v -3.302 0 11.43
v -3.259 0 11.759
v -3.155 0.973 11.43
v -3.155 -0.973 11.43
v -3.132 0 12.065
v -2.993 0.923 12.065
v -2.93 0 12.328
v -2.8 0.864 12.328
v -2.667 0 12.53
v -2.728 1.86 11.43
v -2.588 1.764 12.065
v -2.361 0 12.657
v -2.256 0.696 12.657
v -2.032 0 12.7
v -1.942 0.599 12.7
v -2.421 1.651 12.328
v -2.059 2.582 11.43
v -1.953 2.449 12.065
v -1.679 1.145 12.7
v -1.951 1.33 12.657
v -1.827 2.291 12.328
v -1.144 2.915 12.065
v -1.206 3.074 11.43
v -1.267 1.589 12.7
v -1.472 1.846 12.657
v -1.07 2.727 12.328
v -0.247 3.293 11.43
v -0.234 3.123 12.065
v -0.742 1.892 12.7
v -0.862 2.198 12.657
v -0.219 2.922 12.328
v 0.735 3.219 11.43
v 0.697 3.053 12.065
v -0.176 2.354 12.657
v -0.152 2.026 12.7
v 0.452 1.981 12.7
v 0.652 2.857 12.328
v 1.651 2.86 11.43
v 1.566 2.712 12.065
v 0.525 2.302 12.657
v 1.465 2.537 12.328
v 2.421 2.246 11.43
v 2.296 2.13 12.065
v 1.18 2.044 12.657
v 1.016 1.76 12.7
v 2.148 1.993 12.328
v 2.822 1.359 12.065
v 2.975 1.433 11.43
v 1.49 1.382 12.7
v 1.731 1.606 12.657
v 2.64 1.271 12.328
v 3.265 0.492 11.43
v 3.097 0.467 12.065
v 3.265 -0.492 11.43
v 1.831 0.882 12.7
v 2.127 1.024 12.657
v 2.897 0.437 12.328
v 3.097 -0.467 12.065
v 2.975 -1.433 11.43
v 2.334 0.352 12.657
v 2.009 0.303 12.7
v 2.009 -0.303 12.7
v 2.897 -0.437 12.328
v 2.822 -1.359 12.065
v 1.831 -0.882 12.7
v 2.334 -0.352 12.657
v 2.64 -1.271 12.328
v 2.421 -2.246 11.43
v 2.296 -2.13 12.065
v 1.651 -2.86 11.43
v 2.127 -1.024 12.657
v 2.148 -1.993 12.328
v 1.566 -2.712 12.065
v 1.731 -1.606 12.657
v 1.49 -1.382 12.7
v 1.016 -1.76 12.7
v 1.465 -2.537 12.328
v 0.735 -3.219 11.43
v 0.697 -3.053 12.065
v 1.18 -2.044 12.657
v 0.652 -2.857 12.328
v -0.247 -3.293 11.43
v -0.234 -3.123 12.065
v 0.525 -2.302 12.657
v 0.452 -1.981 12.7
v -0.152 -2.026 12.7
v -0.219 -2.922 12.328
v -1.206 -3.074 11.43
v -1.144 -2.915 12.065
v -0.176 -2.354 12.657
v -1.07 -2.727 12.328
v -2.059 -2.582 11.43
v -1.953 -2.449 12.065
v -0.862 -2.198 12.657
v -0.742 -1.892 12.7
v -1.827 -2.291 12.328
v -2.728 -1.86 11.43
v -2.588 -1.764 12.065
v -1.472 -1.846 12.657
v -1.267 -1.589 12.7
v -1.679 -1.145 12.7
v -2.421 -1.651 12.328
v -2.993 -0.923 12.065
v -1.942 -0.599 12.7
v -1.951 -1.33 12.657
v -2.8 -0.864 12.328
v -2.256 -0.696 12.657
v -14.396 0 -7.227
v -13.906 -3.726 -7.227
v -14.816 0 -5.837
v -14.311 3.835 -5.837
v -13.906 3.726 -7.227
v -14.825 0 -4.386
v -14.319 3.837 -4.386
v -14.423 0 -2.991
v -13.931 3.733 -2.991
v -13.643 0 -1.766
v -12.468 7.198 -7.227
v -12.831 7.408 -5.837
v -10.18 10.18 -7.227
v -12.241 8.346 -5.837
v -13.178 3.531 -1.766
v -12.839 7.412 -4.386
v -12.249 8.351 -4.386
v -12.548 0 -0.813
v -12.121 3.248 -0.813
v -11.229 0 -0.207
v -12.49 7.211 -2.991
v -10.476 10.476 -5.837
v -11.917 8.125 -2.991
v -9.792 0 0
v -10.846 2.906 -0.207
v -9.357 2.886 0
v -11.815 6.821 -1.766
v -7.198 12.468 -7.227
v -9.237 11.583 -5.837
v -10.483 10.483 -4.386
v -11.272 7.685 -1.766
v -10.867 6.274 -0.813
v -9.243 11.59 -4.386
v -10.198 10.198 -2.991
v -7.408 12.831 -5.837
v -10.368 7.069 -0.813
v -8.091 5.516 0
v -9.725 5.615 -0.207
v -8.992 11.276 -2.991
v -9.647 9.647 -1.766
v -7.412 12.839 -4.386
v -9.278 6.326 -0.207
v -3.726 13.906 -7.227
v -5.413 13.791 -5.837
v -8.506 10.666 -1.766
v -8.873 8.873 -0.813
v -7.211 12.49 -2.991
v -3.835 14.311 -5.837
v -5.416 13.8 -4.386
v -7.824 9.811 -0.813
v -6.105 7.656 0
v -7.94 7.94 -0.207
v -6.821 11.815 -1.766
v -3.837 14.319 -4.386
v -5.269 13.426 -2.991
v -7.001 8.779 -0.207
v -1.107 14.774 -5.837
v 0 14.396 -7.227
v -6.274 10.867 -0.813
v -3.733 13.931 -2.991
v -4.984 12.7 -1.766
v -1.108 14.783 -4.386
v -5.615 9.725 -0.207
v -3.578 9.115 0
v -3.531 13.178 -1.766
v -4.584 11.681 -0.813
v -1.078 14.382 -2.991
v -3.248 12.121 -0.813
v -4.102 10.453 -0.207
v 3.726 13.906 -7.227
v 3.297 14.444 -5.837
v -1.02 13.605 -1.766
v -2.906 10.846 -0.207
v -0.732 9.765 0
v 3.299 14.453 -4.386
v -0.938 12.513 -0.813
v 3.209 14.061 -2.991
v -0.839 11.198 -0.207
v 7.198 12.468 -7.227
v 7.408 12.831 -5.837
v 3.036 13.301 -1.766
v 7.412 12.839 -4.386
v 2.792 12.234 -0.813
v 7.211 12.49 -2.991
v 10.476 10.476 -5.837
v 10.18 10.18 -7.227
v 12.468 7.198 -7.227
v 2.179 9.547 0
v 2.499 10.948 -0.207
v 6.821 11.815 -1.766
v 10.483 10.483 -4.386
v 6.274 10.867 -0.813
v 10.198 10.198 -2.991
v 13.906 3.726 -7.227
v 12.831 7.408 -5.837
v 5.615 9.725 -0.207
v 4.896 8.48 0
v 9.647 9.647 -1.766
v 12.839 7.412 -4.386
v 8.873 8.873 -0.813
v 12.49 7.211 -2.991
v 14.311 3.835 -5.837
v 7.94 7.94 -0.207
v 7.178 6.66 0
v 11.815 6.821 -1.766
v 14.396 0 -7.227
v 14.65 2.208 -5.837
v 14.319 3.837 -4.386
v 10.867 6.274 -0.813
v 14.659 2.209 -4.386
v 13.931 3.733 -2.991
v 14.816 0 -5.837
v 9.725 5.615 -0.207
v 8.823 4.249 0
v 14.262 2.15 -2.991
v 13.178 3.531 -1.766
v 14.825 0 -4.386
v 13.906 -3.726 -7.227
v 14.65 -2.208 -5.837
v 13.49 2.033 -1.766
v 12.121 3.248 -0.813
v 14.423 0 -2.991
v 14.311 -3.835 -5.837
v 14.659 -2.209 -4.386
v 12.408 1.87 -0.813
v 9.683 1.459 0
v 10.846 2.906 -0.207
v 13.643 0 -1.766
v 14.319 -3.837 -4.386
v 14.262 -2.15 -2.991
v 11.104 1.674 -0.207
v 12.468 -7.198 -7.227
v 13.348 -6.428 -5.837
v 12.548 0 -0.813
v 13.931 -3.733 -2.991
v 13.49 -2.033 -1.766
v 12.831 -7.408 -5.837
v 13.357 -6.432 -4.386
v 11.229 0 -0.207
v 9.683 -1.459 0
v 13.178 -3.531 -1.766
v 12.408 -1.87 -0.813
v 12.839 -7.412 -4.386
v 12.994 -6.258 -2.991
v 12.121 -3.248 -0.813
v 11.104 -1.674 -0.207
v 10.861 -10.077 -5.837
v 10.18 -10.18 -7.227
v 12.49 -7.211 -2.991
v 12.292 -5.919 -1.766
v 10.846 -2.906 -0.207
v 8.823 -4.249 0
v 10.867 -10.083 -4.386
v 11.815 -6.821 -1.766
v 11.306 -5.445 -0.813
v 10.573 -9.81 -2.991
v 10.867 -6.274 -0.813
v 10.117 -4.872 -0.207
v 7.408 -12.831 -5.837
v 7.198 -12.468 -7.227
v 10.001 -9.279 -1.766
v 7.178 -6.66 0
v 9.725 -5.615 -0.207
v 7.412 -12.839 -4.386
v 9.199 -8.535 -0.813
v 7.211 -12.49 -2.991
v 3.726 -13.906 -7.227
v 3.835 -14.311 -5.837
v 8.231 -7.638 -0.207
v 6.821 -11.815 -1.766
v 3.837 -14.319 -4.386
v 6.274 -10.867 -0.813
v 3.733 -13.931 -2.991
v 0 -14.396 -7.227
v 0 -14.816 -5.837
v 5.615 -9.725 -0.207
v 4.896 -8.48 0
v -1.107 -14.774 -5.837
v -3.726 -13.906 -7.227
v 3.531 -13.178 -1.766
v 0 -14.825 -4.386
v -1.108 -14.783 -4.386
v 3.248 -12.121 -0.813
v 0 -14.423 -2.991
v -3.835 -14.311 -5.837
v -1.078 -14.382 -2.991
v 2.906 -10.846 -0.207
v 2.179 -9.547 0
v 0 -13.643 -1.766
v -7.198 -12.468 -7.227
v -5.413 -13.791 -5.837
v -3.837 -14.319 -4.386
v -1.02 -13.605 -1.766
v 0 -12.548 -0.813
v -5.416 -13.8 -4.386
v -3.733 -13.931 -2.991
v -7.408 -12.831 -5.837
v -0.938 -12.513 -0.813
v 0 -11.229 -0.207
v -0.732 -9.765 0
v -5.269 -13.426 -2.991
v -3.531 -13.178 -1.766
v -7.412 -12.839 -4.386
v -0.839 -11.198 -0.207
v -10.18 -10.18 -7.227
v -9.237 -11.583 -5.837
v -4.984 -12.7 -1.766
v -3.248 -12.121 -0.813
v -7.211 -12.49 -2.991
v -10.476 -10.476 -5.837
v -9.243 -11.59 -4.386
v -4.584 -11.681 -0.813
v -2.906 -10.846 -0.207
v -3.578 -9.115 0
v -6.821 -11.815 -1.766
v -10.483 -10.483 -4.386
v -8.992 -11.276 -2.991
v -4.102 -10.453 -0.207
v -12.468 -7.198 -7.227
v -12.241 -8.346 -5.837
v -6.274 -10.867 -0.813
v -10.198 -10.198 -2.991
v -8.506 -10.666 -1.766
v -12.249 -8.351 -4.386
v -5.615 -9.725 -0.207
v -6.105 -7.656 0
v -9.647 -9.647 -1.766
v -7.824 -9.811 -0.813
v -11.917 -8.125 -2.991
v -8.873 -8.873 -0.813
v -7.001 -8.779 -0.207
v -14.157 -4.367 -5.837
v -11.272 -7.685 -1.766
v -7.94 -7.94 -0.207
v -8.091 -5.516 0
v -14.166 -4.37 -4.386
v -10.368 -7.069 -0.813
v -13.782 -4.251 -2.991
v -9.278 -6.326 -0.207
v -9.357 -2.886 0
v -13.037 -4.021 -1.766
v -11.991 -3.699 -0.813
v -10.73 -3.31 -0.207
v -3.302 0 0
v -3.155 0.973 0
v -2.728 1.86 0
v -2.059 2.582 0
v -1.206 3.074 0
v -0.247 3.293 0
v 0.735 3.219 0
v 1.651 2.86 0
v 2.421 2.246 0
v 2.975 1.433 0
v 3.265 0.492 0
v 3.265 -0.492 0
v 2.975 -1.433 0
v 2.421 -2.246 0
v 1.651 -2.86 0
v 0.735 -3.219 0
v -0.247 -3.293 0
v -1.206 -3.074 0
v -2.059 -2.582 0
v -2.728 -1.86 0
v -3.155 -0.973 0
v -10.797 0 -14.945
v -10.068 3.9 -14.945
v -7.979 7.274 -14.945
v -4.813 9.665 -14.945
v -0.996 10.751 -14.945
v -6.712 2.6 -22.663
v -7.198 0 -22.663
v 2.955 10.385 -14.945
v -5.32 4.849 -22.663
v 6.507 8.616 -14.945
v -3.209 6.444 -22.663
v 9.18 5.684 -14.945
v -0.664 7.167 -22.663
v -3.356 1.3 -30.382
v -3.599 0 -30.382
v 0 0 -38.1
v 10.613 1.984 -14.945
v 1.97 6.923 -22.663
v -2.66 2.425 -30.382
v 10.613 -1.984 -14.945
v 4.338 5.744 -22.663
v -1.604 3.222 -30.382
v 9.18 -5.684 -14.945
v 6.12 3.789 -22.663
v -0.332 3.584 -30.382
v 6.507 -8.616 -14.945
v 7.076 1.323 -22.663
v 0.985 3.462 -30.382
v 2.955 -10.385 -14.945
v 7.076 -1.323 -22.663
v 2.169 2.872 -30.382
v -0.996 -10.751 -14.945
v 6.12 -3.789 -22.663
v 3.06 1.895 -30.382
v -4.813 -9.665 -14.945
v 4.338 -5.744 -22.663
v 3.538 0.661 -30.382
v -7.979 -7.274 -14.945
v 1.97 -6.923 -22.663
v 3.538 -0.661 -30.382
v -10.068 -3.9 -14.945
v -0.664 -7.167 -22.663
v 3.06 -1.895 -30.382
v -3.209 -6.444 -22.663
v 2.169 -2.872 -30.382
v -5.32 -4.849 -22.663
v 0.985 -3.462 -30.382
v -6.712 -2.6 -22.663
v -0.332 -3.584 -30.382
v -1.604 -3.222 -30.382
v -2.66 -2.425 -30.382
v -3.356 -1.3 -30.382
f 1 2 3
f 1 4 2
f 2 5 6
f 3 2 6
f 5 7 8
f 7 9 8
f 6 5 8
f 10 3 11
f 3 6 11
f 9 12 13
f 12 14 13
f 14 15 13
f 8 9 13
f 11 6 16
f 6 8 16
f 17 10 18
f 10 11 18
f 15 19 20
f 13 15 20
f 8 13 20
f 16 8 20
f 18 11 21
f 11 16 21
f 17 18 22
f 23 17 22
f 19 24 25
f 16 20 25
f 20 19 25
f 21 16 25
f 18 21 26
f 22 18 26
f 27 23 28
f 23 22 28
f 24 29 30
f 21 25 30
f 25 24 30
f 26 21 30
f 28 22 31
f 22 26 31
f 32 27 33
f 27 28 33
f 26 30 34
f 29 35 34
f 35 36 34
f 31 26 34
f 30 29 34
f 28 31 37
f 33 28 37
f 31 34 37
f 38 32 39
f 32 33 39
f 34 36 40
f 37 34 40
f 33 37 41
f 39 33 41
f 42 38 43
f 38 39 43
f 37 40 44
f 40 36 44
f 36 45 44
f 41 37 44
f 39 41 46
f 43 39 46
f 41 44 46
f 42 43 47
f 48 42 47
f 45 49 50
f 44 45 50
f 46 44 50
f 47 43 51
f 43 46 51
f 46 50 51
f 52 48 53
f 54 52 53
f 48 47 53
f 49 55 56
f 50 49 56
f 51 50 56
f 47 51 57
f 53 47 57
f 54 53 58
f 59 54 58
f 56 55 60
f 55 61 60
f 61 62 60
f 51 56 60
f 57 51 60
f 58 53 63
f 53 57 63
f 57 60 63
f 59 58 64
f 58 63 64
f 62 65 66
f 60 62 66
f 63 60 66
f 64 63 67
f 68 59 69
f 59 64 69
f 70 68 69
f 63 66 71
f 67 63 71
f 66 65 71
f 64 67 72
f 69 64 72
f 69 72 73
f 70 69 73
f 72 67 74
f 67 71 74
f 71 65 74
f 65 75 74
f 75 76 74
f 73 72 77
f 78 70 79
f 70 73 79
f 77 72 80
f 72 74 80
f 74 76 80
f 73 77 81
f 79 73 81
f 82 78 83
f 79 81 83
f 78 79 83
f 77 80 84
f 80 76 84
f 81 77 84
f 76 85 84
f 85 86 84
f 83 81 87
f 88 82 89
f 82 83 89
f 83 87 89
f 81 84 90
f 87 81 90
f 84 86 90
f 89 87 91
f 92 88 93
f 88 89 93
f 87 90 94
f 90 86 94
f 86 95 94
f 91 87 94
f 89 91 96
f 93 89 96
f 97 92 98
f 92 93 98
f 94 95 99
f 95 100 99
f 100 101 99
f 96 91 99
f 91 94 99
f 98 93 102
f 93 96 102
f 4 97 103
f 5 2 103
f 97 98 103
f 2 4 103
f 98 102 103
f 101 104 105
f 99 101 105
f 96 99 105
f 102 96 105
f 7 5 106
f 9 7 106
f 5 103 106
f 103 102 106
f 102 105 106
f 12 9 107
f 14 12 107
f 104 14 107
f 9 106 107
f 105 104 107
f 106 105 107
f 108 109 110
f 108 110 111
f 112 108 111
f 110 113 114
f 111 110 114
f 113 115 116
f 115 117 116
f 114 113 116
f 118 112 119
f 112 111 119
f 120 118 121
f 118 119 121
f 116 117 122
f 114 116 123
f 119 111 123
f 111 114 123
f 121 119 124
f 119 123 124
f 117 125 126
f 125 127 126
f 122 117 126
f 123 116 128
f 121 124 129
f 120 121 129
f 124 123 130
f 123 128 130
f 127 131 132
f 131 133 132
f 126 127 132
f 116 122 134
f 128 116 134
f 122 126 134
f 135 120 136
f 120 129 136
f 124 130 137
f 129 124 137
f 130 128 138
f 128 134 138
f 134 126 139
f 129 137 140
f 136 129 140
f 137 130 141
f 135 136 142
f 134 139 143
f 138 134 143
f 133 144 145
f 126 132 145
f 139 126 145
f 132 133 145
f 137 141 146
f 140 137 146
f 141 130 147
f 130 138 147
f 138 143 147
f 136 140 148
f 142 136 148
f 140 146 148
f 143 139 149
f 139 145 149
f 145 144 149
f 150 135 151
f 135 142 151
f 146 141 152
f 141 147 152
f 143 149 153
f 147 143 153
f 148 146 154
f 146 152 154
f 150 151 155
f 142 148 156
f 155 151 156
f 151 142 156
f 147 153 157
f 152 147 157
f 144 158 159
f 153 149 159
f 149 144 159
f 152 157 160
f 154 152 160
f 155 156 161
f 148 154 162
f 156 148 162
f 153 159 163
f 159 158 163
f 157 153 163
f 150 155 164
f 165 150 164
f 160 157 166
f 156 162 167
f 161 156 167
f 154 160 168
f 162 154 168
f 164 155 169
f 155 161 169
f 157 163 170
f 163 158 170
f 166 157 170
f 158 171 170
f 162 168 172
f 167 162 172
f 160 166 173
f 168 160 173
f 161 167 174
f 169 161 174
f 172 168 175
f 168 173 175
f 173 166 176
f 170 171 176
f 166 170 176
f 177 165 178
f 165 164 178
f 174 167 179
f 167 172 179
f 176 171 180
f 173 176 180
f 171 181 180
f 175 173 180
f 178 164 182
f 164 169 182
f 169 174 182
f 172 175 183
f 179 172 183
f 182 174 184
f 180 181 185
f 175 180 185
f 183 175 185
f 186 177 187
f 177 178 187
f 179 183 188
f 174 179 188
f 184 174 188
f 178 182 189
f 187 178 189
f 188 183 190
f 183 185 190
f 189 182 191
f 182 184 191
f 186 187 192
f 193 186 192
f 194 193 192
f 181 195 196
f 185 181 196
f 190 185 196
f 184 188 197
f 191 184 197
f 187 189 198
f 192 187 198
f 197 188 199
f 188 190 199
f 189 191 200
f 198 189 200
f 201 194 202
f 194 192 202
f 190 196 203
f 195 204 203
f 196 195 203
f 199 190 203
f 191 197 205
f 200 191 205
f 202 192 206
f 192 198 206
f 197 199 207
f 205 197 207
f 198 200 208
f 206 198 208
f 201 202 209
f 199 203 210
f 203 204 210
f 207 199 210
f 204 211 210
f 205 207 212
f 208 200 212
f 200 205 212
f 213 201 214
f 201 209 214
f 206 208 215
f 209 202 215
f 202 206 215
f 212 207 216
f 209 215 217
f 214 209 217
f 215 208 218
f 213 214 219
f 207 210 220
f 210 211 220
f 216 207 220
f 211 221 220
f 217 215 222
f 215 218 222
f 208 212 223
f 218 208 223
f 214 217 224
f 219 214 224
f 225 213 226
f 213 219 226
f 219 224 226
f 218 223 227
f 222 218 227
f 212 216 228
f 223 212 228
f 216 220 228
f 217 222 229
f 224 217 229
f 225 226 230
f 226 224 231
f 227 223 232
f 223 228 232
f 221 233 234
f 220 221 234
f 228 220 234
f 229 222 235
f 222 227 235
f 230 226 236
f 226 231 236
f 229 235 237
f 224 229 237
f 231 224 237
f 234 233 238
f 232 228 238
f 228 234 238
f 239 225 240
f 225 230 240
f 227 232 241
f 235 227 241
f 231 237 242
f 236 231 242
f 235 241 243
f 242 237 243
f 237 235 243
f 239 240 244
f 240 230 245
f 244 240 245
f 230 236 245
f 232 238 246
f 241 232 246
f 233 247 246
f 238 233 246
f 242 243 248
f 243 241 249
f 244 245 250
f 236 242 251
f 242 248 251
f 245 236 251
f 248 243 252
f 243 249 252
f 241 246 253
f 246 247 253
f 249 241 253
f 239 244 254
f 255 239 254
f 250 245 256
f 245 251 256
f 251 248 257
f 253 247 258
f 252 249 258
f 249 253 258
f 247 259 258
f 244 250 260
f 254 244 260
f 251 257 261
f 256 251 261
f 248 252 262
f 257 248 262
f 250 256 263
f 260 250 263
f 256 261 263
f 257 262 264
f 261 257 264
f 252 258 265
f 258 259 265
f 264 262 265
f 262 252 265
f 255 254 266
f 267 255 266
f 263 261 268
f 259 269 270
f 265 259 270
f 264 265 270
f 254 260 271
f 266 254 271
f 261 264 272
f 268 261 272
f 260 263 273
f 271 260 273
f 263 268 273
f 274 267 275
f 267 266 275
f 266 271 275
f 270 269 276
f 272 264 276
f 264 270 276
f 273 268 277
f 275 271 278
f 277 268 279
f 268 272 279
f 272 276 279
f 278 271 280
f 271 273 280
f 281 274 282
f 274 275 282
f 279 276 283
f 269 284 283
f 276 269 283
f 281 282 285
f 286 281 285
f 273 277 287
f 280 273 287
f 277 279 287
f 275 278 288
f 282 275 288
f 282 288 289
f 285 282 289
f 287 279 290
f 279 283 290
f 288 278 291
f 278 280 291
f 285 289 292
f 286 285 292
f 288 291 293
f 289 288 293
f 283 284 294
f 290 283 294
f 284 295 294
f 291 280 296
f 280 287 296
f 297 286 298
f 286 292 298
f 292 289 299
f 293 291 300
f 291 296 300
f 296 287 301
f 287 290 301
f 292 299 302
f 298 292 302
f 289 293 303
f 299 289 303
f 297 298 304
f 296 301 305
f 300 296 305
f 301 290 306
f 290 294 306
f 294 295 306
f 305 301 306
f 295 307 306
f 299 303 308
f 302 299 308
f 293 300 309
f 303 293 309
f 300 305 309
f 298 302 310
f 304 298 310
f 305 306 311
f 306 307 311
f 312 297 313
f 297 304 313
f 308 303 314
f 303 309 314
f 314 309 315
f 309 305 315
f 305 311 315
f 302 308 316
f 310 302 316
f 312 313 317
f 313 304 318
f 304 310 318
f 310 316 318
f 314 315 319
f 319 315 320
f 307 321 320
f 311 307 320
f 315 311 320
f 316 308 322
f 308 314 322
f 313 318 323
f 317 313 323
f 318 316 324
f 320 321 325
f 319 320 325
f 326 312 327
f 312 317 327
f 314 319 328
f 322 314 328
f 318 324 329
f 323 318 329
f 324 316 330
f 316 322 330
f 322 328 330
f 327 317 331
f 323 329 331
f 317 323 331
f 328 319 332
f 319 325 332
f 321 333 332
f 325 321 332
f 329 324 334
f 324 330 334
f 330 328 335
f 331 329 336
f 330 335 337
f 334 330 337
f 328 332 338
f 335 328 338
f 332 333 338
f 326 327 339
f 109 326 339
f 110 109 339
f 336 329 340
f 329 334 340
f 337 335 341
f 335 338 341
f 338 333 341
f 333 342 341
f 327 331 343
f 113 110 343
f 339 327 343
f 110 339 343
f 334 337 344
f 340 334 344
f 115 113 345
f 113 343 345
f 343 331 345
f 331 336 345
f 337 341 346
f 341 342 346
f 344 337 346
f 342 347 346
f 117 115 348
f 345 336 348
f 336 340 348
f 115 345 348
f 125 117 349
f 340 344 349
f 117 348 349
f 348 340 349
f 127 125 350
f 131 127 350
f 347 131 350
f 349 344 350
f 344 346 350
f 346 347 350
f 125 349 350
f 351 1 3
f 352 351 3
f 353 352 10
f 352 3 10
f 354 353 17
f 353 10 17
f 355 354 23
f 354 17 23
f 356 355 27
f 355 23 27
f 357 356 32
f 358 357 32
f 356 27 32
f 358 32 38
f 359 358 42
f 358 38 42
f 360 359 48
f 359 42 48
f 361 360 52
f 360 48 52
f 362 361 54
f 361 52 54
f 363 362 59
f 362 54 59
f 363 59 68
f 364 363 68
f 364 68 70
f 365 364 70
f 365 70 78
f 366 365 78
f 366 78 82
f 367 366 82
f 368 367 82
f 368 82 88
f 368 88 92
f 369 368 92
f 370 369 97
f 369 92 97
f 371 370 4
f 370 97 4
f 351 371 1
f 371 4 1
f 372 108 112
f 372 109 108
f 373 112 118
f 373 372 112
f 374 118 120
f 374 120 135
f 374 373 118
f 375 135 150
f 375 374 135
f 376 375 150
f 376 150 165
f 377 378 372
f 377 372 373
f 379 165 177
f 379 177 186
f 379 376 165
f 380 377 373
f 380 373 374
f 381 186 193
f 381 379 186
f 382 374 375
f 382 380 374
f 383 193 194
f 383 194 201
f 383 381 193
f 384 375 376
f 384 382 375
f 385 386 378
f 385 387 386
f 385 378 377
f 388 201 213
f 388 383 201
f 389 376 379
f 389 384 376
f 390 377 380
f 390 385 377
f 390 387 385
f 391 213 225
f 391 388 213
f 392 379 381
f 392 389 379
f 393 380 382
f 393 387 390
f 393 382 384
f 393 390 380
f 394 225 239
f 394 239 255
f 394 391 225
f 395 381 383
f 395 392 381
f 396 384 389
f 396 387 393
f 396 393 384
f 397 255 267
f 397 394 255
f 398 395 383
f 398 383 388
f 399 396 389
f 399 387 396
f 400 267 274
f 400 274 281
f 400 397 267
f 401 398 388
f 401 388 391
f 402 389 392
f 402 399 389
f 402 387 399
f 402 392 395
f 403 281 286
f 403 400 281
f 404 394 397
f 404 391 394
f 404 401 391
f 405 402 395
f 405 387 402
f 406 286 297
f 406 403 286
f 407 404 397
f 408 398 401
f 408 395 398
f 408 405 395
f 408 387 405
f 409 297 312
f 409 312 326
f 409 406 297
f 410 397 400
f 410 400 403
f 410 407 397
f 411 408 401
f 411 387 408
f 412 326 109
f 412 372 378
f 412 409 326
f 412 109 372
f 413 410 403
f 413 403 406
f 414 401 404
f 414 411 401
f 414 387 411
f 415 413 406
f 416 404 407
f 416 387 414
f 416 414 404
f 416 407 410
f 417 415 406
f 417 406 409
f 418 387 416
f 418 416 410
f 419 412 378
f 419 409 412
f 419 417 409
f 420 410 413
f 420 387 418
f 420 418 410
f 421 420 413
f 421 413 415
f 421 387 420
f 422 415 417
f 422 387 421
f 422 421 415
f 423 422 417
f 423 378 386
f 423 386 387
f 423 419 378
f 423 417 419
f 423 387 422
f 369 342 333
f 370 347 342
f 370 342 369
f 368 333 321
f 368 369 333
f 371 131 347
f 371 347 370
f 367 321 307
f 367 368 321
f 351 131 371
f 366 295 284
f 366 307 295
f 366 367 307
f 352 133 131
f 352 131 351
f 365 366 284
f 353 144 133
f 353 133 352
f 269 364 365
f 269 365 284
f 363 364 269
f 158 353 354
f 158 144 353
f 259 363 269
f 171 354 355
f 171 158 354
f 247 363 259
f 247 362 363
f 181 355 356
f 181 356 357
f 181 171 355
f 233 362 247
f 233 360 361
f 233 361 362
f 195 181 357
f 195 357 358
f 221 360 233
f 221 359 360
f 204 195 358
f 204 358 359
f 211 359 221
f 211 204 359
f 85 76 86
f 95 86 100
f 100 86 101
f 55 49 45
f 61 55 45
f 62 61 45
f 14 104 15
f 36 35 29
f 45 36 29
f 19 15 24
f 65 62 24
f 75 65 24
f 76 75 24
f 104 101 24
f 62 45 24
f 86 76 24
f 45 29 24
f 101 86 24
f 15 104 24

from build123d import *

# Parameters (mm, degrees)
F0_W = 3.302
F0_H = 12.7
F2_R = 5.08
F3_R = 1.27


with BuildPart() as f1:
    # F0 (on Front) → F1 (revolve)
    with BuildSketch(Plane.XZ):
        Polygon((-3.302, 0), (-17.766322, 0), (0, -38.1), (0, 0), align=None)
        with Locations((-1.651, 6.35)):
            Rectangle(F0_W, F0_H)
    revolve(axis=Axis((0, 0, -19.05), (0, 0, -1)))

    # F2
    f2_edges = [f1.edges().sort_by_distance(p)[0] for p in [
        (17.766322, 0, 0),
    ]]
    fillet(f2_edges, radius=F2_R)

    # F3
    f3_edges = [f1.edges().sort_by_distance(p)[0] for p in [
        (3.302, 0, 12.7),
    ]]
    fillet(f3_edges, radius=F3_R)


solid = f1.part
